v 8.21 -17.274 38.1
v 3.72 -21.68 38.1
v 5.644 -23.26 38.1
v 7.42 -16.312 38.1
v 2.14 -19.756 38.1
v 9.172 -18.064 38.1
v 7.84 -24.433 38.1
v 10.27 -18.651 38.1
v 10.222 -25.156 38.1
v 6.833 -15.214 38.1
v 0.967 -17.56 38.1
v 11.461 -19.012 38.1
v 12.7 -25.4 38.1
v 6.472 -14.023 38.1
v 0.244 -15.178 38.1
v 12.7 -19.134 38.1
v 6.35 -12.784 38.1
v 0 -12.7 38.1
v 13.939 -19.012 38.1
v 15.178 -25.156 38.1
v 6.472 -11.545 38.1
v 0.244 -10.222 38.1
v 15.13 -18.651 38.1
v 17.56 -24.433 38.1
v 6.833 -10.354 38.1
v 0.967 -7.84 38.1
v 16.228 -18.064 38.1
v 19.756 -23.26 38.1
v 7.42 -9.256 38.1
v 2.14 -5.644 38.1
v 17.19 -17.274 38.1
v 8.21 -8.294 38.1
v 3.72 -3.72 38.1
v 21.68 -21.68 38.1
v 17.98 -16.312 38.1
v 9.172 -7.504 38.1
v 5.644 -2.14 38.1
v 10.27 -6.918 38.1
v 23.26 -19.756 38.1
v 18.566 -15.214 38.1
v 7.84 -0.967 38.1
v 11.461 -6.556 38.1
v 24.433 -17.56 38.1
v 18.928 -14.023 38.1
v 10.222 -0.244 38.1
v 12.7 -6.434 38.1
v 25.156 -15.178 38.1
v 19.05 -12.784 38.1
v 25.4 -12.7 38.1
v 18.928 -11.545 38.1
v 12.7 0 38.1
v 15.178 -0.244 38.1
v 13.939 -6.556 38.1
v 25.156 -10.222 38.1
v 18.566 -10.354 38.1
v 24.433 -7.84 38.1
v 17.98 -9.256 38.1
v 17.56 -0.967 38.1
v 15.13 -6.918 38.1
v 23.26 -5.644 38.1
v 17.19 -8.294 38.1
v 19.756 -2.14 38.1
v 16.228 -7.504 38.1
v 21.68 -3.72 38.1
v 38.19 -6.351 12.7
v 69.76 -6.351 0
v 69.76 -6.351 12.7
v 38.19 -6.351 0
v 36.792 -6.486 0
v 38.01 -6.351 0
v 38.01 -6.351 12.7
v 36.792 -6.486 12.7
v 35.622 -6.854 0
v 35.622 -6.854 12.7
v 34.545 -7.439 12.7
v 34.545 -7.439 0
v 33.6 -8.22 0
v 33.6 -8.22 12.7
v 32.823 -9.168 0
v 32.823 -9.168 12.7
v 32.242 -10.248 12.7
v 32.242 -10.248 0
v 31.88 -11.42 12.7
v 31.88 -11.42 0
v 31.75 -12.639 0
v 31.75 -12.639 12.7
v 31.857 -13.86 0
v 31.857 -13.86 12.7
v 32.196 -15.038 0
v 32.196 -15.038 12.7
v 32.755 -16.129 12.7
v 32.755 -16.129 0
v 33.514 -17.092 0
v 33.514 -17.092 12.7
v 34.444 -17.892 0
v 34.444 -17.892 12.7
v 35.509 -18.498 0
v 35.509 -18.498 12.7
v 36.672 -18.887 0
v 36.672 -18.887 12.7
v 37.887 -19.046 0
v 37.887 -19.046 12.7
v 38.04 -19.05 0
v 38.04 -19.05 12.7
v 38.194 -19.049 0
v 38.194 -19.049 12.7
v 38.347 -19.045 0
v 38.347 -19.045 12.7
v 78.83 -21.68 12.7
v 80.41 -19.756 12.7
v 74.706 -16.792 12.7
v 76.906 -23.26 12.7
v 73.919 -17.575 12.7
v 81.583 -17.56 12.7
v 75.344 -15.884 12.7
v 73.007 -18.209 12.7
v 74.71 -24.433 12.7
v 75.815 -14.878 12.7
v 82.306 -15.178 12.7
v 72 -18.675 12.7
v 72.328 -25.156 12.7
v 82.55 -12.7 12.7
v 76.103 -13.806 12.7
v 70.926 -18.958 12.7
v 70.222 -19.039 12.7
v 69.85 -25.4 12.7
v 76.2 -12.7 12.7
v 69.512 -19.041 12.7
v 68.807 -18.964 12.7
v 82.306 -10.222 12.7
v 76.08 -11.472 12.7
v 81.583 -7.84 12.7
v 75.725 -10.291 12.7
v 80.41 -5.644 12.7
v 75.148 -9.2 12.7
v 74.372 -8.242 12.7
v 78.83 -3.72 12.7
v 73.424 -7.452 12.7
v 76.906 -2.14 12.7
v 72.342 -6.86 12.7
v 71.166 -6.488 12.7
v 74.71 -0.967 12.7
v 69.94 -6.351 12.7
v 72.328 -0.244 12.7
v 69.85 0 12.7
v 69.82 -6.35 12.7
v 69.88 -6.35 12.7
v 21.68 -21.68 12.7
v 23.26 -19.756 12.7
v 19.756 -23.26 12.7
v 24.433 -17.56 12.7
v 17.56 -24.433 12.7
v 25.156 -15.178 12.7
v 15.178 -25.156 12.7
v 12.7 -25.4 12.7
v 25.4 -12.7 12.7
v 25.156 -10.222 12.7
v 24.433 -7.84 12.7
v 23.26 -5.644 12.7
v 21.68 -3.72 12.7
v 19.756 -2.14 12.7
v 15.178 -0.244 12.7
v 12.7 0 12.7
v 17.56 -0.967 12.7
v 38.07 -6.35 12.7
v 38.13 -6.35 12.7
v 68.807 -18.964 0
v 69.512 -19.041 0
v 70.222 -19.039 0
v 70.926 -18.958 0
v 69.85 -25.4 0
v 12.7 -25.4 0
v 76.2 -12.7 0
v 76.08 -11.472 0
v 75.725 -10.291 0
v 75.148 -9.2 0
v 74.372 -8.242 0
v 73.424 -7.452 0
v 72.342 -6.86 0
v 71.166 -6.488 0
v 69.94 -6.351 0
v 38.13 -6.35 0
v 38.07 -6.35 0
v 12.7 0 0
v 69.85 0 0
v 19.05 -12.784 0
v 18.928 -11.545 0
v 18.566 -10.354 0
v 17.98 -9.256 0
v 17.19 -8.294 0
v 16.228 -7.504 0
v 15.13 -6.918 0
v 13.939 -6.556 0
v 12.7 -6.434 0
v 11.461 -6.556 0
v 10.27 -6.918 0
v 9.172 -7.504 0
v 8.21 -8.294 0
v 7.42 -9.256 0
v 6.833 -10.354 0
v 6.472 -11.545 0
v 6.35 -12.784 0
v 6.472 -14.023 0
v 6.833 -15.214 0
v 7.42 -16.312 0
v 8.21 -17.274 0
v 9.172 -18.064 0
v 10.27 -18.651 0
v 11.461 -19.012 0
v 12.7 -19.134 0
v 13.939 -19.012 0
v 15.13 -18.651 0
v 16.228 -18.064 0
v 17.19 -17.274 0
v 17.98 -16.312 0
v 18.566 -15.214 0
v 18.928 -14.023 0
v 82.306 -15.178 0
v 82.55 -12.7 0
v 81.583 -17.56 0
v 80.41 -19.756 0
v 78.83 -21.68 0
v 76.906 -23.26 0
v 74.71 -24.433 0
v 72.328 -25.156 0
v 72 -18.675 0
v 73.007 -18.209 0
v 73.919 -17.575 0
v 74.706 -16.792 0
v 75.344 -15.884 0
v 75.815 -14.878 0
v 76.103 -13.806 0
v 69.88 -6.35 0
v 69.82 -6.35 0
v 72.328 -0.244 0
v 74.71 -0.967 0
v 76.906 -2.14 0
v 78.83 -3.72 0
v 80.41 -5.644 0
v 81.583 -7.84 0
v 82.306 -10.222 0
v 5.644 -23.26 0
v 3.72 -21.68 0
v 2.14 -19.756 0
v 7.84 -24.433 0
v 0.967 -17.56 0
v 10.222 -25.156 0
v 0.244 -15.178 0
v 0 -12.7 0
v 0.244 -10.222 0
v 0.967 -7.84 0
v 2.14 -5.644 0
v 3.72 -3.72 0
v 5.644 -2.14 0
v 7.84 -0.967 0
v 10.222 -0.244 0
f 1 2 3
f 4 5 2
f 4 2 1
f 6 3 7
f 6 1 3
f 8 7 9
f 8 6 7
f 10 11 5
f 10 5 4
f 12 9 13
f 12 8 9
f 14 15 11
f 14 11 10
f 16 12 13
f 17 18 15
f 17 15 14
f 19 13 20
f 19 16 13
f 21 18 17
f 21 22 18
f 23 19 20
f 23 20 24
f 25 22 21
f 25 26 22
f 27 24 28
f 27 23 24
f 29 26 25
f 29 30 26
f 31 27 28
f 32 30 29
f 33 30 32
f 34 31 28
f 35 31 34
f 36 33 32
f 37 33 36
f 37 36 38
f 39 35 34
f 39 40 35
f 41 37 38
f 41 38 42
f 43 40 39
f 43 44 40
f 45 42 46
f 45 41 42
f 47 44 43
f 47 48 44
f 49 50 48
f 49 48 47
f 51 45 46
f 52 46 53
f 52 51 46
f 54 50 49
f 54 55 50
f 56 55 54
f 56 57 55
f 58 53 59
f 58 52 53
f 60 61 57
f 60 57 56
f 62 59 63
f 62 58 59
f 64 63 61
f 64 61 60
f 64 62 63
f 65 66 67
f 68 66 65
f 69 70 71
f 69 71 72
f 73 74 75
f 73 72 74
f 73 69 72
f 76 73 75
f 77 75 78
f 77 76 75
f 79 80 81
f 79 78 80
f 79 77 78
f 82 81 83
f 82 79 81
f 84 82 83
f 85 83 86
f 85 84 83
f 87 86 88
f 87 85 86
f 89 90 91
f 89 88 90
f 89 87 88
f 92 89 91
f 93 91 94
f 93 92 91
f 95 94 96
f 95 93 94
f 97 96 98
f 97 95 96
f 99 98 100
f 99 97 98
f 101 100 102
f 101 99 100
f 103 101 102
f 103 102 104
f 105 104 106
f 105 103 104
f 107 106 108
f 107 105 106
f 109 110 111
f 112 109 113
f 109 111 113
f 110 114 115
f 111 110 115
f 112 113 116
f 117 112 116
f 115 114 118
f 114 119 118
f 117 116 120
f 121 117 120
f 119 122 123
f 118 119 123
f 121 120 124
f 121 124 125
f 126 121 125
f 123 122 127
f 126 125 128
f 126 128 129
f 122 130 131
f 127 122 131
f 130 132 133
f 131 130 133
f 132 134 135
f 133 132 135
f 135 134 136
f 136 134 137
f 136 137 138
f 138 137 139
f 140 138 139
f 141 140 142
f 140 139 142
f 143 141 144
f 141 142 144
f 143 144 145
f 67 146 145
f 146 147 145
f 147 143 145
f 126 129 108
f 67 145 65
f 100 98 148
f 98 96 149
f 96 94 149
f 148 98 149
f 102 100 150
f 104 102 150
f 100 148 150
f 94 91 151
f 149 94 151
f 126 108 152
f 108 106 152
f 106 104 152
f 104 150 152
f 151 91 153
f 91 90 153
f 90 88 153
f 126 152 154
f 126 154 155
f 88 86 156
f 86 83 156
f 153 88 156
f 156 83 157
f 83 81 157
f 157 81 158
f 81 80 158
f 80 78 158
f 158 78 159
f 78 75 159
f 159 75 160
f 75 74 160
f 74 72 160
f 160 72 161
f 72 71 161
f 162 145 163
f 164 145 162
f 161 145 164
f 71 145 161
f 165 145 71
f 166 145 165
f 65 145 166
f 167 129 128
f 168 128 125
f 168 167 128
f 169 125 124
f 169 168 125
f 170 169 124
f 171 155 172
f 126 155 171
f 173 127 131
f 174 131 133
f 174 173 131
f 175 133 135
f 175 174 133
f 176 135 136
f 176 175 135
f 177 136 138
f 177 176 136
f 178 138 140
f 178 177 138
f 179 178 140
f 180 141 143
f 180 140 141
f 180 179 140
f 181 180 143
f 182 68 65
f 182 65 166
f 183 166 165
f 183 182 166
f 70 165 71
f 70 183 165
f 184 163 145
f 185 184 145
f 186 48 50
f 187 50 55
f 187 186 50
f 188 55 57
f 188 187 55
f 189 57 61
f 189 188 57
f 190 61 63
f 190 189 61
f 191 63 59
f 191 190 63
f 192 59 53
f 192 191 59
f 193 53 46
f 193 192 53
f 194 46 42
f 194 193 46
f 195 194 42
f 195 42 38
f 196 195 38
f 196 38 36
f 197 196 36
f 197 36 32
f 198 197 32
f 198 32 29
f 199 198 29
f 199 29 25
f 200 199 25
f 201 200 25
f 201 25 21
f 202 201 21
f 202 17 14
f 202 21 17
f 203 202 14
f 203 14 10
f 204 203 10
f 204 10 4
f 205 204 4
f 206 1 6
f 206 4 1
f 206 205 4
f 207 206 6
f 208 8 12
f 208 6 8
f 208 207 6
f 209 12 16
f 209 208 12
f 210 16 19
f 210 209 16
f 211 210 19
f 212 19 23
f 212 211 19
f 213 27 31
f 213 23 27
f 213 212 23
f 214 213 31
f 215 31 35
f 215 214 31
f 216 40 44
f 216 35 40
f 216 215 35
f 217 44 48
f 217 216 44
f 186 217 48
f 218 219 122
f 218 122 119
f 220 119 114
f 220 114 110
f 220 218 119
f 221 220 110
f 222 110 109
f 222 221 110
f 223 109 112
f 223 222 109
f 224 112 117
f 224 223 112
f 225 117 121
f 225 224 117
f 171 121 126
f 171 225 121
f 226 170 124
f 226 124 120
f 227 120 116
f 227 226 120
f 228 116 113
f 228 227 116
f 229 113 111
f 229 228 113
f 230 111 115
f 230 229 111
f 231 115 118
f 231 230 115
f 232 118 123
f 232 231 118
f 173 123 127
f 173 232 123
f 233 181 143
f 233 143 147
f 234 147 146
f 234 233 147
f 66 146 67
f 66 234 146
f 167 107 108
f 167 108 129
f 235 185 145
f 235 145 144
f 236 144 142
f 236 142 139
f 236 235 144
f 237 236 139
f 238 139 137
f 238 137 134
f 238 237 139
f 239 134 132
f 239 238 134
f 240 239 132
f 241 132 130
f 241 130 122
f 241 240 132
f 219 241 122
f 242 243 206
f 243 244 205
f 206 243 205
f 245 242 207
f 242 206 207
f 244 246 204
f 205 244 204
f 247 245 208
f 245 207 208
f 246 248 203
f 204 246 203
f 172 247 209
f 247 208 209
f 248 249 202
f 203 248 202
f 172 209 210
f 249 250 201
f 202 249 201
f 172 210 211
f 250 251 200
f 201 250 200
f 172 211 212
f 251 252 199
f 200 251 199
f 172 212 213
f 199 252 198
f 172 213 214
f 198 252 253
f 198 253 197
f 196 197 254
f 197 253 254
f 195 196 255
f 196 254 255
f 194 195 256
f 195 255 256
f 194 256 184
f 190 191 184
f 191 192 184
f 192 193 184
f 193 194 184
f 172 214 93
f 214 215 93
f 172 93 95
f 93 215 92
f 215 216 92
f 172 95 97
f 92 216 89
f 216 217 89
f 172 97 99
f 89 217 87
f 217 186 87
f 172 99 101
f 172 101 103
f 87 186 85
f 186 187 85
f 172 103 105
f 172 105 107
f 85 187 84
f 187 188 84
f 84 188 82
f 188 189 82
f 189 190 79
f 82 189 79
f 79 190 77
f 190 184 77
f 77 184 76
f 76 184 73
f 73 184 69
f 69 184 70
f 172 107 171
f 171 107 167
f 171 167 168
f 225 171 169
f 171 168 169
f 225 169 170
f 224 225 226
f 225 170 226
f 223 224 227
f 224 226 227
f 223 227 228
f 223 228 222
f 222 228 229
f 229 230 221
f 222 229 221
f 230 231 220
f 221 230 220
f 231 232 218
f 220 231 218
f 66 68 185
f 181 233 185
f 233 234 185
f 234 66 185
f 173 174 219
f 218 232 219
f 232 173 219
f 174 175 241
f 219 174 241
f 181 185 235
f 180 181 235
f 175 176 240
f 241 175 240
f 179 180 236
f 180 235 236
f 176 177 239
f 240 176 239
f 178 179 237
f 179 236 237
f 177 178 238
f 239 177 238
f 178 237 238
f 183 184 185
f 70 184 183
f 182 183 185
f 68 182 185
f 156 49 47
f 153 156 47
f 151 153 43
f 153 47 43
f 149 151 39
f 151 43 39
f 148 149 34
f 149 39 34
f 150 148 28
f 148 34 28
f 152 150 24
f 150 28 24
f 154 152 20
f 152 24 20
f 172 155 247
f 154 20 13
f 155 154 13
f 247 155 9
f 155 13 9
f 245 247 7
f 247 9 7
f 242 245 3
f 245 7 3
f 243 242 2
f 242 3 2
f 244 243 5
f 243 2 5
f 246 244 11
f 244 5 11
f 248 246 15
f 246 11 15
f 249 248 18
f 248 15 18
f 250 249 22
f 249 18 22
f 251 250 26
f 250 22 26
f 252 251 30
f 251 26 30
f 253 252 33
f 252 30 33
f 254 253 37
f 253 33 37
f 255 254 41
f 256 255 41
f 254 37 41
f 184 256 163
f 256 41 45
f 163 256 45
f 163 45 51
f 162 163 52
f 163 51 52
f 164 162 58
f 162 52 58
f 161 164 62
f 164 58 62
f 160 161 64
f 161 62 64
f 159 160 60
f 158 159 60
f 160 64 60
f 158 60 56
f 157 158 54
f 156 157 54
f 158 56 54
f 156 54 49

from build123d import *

# Parameters (mm, degrees)
F1_DEPTH  = 25.4
F3_W      = 25.4
F3_H      = 25.4
F4_DEPTH  = 25.401
F5_R      = 12.7
F6_DEPTH  = 38.1
F8_DEPTH  = 12.701
F10_DEPTH = 38.101
F11_R     = 6.35
F12_DEPTH = 38.101
F14_DEPTH = 38.101


with BuildPart() as f1:
    # F0 (on Front) → F1 (new body)
    with BuildSketch(Plane.XZ):
        Polygon((25.4, 38.1), (0, 38.1), (0, 0), (82.55, 0), (82.55, 12.7), (25.4, 12.7), align=None)
    extrude(amount=F1_DEPTH)

    # F3 (on Front) → F4 (cut, through all)
    with BuildSketch(Plane.XZ):
        with Locations((12.7, 25.4)):
            Rectangle(F3_W, F3_H)
    extrude(amount=F4_DEPTH, mode=Mode.SUBTRACT)

    # F5 (on Top) → F6 (join)
    with BuildSketch(Plane.XY):
        with Locations((12.7, -12.7)):
            Circle(F5_R)
    extrude(amount=F6_DEPTH)

    # F8 (cut, through all): faces of the model
    f8_faces = [f1.faces().sort_by_distance(p)[0] for p in [
        (2.8367728246, -2.8367728246, 12.7),
        (2.8367728246, -22.5632271754, 12.7),
    ]]
    extrude(f8_faces, amount=-F8_DEPTH, mode=Mode.SUBTRACT)

    # F9 (on Top) → F10 (cut, through all)
    with BuildSketch(Plane.XY):
        with BuildLine():
            ThreePointArc((70.9260618119, -18.9581619488), (74.7056921497, -16.792035404), (76.2, -12.7))
            ThreePointArc((76.2, -12.7), (74.3718130047, -8.2417820656), (69.9399347557, -6.3506369028))
            Line((69.9399347557, -6.3506369028), (69.7600652443, -6.3506369028))
            ThreePointArc((69.7600652443, -6.3506369028), (63.5180353707, -12.2217490892), (68.8073960441, -18.9638228735))
            Line((68.8073960441, -18.9638228735), (70.9260618119, -18.9581619488))
        make_face()
        with BuildLine():
            Line((69.7600652443, -6.3506369028), (69.9399347557, -6.3506369028))
            ThreePointArc((69.9399347557, -6.3506369028), (69.85, -6.35), (69.7600652443, -6.3506369028))
        make_face()
        with BuildLine():
            ThreePointArc((68.8073960441, -18.9638228735), (69.8669666894, -19.0499773331), (70.9260618119, -18.9581619488))
            Line((70.9260618119, -18.9581619488), (68.8073960441, -18.9638228735))
        make_face()
        with BuildLine():
            ThreePointArc((68.8073960441, -18.9638228735), (63.5180353707, -12.2217490892), (69.7600652443, -6.3506369028))
            Line((69.7600652443, -6.3506369028), (38.1899347557, -6.3506369028))
            ThreePointArc((38.1899347557, -6.3506369028), (42.6218130047, -8.2417820656), (44.45, -12.7))
            ThreePointArc((44.45, -12.7), (42.6764639727, -17.1020992158), (38.3465425178, -19.0452121152))
            Line((38.3465425178, -19.0452121152), (68.8073960441, -18.9638228735))
        make_face()
        with BuildLine():
            Line((38.0100652443, -6.3506369028), (38.1899347557, -6.3506369028))
            ThreePointArc((38.1899347557, -6.3506369028), (38.1, -6.35), (38.0100652443, -6.3506369028))
        make_face()
        with BuildLine():
            ThreePointArc((44.45, -12.7), (42.6218130047, -8.2417820656), (38.1899347557, -6.3506369028))
            Line((38.1899347557, -6.3506369028), (38.0100652443, -6.3506369028))
            ThreePointArc((38.0100652443, -6.3506369028), (31.7502965226, -12.6386342958), (37.8873686745, -19.0464389952))
            Line((37.8873686745, -19.0464389952), (38.3465425178, -19.0452121152))
            ThreePointArc((38.3465425178, -19.0452121152), (42.6764639727, -17.1020992158), (44.45, -12.7))
        make_face()
        with BuildLine():
            ThreePointArc((37.8873686745, -19.0464389952), (38.1169666894, -19.0499773331), (38.3465425178, -19.0452121152))
            Line((38.3465425178, -19.0452121152), (37.8873686745, -19.0464389952))
        make_face()
    extrude(amount=F10_DEPTH, mode=Mode.SUBTRACT)

    # F11 (on Top) → F12 (cut, through all)
    with BuildSketch(Plane.XY):
        with Locations((12.6997202718, -12.7842912701)):
            Circle(F11_R)
    extrude(amount=F12_DEPTH, mode=Mode.SUBTRACT)

    # F13 (on Top) → F14 (cut, through all)
    with BuildSketch(Plane.XY):
        with BuildLine():
            ThreePointArc((69.85, 0), (78.8302561211, -3.7197438789), (82.55, -12.7))
            Line((82.55, -12.7), (82.55, 0))
            Line((82.55, 0), (69.85, 0))
        make_face()
        with BuildLine():
            ThreePointArc((82.55, -12.7), (78.8302561211, -21.6802561211), (69.85, -25.4))
            Line((69.85, -25.4), (82.55, -25.4))
            Line((82.55, -25.4), (82.55, -12.7))
        make_face()
    extrude(amount=F14_DEPTH, mode=Mode.SUBTRACT)


solid = f1.part
